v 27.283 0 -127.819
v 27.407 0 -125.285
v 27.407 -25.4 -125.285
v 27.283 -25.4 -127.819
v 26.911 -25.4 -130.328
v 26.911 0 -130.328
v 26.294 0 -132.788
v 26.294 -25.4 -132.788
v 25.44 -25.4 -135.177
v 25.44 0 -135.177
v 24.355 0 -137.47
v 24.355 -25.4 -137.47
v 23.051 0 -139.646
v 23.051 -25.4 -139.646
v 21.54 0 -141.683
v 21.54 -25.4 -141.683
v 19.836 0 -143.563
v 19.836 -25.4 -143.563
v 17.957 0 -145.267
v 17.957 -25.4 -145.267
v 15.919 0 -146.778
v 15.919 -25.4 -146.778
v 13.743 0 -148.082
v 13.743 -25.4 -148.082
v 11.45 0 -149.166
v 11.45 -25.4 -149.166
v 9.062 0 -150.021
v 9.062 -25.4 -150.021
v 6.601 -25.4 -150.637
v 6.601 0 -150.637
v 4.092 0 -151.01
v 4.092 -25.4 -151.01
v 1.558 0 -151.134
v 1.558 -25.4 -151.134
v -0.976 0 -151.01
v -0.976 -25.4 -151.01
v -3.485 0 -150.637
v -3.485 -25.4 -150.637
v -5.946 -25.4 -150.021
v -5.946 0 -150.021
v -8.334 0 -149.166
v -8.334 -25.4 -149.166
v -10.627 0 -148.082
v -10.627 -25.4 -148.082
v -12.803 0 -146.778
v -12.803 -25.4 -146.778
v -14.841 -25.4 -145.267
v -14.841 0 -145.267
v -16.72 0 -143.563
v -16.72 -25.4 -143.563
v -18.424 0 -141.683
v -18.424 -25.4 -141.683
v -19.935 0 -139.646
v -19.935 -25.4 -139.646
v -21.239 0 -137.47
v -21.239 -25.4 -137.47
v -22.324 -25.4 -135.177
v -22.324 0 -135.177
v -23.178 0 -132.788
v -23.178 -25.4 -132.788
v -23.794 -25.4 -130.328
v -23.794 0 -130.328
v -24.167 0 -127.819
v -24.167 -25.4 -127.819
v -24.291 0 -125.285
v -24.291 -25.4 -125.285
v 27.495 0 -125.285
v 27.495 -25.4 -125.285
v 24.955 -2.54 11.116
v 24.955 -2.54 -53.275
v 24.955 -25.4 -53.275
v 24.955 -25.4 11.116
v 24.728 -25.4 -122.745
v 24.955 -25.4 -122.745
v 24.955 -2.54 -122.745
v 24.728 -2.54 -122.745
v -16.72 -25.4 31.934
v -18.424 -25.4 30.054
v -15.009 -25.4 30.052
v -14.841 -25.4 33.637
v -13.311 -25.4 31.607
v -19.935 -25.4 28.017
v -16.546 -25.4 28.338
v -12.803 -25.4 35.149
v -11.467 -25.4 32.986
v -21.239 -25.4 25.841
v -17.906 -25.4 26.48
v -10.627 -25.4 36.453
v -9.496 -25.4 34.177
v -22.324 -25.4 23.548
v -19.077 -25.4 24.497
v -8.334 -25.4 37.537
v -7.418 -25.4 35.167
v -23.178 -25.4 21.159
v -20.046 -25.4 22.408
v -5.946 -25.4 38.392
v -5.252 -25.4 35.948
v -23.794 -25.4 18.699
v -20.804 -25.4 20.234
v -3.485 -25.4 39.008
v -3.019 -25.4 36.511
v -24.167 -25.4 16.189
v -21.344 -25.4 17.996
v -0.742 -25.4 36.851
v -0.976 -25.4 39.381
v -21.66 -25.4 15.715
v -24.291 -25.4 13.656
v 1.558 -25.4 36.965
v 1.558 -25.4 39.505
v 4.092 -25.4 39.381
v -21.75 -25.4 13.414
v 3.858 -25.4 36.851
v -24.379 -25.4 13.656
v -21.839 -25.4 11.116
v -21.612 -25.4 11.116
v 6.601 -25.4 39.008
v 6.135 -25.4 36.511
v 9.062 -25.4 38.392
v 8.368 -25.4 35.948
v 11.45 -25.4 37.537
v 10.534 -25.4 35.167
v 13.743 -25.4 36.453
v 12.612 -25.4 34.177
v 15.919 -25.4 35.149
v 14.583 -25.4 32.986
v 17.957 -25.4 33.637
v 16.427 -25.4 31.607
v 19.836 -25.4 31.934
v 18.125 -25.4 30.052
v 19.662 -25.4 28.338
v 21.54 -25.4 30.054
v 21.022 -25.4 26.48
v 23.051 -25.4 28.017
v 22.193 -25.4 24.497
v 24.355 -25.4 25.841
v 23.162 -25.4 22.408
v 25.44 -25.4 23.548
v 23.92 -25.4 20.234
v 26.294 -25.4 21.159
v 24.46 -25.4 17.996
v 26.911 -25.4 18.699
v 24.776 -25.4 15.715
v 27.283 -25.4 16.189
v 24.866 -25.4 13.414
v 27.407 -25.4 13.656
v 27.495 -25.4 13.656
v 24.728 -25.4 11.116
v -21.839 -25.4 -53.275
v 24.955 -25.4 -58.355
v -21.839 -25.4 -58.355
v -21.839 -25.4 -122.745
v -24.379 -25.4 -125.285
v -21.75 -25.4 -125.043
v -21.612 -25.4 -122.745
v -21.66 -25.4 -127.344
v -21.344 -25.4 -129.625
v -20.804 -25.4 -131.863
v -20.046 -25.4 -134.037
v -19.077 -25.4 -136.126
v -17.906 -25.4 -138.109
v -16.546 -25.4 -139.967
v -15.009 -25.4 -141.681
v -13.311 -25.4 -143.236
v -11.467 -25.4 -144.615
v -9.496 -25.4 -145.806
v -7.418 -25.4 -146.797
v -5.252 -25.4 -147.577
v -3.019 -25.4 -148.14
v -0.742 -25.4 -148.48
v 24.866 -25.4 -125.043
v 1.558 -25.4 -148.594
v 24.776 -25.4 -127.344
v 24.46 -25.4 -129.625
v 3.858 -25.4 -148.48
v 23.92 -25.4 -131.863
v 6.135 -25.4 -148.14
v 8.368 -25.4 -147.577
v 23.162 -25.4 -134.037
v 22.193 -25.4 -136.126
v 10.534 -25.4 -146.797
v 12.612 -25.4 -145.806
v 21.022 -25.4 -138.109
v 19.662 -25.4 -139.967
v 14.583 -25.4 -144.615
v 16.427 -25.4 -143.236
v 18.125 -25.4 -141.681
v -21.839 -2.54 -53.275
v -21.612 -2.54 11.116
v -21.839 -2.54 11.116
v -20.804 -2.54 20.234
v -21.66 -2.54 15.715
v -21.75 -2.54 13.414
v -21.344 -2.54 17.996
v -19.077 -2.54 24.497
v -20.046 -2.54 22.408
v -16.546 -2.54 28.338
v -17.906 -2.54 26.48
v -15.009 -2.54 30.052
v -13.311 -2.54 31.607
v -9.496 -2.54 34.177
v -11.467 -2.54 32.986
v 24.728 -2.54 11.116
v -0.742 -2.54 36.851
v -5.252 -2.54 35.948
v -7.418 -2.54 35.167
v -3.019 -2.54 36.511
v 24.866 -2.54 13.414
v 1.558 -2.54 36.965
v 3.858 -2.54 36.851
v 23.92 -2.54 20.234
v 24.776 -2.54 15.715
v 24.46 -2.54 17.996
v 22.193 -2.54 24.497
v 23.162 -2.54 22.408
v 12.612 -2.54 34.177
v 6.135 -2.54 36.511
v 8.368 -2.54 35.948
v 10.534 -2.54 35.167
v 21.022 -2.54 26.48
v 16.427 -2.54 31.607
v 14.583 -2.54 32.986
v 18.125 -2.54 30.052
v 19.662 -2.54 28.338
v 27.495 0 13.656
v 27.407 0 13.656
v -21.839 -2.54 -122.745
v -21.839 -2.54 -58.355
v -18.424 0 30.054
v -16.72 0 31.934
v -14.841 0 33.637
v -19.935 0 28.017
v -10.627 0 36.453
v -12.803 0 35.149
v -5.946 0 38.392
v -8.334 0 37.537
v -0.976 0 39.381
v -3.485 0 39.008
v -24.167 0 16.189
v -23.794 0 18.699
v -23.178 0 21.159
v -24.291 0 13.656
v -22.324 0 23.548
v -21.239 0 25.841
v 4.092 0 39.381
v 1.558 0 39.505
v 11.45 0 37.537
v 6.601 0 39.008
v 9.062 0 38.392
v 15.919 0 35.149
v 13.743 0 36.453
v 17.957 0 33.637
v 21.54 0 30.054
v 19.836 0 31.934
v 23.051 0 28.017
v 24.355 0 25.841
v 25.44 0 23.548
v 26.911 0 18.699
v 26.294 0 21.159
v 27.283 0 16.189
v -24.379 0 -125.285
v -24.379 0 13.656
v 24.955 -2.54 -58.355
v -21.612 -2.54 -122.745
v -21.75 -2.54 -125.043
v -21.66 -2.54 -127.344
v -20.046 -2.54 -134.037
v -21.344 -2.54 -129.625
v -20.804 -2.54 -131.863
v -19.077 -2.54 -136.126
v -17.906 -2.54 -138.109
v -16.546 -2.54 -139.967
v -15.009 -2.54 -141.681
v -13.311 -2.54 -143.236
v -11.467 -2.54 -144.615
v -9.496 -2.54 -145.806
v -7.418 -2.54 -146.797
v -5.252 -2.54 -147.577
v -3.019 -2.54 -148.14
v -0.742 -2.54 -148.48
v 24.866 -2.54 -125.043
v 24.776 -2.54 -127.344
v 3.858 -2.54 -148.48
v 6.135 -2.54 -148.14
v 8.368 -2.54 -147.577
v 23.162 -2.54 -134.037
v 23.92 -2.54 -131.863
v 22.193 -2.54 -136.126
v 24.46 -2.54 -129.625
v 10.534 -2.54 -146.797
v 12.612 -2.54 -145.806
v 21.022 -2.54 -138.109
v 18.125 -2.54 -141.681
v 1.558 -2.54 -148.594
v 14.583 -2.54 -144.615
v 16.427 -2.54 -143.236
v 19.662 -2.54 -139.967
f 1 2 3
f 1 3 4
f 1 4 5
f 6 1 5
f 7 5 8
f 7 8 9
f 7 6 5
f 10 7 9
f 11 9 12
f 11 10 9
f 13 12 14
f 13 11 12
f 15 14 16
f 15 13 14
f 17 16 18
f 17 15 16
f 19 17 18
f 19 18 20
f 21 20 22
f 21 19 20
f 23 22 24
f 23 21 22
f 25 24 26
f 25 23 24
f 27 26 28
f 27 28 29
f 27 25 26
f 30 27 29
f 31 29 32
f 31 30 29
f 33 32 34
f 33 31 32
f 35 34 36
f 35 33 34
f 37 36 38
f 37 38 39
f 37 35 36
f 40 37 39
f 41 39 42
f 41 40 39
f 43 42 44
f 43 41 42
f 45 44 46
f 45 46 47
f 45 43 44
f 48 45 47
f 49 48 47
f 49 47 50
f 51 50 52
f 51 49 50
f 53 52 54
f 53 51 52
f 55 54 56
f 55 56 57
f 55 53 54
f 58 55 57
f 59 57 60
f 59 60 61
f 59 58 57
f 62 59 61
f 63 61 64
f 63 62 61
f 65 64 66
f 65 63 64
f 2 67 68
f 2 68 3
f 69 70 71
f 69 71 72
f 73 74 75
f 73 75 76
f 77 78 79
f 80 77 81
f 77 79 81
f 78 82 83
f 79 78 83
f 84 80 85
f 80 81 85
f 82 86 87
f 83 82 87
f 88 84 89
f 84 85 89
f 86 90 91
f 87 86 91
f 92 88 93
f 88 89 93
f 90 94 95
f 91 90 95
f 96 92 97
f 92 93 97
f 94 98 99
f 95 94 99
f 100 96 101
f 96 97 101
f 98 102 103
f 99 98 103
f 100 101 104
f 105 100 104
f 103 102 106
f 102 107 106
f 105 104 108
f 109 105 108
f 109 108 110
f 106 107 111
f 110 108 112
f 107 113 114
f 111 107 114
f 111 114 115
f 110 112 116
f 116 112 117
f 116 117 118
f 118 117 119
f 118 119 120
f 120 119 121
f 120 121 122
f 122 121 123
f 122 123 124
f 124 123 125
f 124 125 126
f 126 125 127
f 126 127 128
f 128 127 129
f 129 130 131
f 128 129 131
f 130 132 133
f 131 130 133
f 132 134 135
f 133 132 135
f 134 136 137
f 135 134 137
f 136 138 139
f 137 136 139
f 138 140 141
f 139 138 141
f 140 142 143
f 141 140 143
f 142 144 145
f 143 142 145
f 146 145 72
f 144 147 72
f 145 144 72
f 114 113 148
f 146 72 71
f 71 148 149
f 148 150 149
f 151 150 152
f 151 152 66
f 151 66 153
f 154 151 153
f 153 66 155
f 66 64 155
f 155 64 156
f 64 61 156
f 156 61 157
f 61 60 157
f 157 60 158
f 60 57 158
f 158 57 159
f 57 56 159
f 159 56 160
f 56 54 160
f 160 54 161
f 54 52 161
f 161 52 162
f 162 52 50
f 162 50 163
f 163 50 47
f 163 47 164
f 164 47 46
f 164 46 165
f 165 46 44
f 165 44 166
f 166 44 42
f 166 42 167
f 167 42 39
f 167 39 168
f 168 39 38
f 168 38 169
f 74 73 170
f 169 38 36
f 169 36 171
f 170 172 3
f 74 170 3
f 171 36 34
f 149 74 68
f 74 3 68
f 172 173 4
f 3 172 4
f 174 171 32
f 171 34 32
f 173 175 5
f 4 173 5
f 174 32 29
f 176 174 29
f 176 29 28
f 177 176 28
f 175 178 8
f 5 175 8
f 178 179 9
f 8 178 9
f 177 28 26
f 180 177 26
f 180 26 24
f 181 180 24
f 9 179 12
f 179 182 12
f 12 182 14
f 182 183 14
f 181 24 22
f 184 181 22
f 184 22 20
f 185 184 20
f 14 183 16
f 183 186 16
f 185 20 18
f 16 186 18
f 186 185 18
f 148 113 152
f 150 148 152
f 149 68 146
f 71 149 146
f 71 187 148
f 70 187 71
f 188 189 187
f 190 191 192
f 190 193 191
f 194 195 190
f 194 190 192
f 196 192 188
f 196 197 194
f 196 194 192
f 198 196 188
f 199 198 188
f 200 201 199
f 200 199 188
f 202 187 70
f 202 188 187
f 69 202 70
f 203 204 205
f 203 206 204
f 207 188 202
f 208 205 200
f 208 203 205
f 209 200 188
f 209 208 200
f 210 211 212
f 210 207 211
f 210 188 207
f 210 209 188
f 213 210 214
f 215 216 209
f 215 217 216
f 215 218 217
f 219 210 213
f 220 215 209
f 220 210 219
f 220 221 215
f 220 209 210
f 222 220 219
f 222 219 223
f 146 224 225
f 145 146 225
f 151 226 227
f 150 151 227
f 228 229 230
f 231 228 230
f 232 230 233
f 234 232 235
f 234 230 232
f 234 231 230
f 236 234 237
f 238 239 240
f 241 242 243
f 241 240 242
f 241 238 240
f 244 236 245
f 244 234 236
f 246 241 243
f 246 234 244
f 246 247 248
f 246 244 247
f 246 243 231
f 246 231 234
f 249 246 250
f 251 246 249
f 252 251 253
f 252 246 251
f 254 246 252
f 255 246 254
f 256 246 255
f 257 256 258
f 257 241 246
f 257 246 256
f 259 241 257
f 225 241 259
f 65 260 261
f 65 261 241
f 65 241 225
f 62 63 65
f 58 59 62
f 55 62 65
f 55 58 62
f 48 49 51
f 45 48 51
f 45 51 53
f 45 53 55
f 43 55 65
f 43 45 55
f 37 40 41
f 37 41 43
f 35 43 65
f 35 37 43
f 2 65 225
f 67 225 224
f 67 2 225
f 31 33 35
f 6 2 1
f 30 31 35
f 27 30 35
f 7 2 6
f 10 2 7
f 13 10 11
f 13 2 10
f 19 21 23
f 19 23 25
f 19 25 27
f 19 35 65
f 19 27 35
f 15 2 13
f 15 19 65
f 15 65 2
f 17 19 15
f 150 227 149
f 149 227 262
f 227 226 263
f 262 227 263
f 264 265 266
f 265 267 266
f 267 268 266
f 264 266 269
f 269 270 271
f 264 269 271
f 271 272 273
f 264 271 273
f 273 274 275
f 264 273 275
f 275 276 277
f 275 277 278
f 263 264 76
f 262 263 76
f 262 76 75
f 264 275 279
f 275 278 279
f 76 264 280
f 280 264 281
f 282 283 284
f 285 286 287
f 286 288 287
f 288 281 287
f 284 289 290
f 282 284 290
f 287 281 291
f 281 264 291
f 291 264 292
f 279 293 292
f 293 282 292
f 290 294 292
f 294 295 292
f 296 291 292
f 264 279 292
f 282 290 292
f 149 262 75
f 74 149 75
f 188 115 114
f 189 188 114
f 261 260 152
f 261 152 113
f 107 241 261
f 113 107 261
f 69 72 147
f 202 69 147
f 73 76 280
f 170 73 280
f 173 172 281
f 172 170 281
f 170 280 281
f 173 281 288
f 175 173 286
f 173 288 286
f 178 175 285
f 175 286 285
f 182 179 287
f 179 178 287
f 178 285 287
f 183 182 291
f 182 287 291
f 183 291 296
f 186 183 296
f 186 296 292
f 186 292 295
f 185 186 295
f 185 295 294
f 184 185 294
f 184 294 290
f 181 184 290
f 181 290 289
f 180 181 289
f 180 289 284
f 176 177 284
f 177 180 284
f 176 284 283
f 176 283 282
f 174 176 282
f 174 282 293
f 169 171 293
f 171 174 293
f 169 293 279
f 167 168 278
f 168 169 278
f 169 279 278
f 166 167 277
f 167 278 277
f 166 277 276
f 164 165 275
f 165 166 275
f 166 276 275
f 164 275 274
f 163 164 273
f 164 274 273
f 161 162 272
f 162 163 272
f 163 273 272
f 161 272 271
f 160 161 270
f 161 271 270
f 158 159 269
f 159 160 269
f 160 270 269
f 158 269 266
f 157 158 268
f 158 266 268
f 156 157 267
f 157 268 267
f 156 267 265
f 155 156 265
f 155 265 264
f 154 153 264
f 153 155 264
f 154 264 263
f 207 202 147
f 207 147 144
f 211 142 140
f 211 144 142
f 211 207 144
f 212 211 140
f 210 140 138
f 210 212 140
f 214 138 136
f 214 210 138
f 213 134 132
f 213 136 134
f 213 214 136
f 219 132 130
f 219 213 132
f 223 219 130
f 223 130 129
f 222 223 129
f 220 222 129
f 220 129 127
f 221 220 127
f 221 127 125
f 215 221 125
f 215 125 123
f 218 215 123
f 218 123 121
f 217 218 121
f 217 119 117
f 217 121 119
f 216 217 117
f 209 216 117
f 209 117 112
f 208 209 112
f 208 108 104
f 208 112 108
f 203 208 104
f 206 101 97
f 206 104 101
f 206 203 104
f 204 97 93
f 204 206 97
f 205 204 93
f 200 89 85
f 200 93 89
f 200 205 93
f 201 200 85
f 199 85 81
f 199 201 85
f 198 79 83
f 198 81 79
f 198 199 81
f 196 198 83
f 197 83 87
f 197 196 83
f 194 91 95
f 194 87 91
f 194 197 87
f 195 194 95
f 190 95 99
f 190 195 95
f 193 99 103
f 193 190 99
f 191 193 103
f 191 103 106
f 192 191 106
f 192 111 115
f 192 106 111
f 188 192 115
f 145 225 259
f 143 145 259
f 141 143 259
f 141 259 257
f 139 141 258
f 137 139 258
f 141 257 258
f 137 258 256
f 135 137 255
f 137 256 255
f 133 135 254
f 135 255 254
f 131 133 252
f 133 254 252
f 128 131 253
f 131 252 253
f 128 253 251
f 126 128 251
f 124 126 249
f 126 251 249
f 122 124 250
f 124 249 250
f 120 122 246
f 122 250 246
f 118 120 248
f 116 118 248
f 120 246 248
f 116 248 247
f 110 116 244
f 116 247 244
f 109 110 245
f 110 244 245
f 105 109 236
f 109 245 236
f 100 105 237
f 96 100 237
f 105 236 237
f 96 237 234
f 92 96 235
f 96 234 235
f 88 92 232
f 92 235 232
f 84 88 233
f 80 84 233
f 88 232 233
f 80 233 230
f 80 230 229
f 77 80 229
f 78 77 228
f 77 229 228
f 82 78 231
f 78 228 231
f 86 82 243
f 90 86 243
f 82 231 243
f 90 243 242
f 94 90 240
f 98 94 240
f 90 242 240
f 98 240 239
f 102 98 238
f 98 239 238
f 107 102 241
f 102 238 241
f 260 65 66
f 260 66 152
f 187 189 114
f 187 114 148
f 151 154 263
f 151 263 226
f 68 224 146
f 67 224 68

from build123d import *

# Parameters (mm, degrees)
F1_DEPTH = 25.4
F3_T     = -2.54


with BuildPart() as f1:
    # F0 (on Front) → F1 (new body)
    with BuildSketch(Plane.XZ):
        Polygon((-24.2911779621, 13.655773364), (-24.3787635118, 13.655773364), (-24.3787635118, -55.814538151), (27.4948440492, -55.814538151), (27.4948440492, 13.655773364), (27.4072584995, 13.655773364), align=None)
        with BuildLine():
            ThreePointArc((27.4072584995, 13.655773364), (1.5580402687, 39.5049915948), (-24.2911779621, 13.655773364))
            Line((-24.2911779621, 13.655773364), (27.4072584995, 13.655773364))
        make_face()
    extrude(amount=F1_DEPTH)

    # F3
    f3_openings = [f1.faces().sort_by_distance(p)[0] for p in [
        (1.55804, -25.4, -10.770056),
    ]]
    offset(amount=F3_T, openings=f3_openings, kind=Kind.INTERSECTION)

    # F4: F1 across face


with BuildPart() as f1_1:
    add(f1.part)
    add(f1.part.mirror(Plane(origin=(1.5580402687, -12.7, -55.814538151), x_dir=(1, 0, 0), z_dir=(0, 0, -1))))


solid = f1_1.part
